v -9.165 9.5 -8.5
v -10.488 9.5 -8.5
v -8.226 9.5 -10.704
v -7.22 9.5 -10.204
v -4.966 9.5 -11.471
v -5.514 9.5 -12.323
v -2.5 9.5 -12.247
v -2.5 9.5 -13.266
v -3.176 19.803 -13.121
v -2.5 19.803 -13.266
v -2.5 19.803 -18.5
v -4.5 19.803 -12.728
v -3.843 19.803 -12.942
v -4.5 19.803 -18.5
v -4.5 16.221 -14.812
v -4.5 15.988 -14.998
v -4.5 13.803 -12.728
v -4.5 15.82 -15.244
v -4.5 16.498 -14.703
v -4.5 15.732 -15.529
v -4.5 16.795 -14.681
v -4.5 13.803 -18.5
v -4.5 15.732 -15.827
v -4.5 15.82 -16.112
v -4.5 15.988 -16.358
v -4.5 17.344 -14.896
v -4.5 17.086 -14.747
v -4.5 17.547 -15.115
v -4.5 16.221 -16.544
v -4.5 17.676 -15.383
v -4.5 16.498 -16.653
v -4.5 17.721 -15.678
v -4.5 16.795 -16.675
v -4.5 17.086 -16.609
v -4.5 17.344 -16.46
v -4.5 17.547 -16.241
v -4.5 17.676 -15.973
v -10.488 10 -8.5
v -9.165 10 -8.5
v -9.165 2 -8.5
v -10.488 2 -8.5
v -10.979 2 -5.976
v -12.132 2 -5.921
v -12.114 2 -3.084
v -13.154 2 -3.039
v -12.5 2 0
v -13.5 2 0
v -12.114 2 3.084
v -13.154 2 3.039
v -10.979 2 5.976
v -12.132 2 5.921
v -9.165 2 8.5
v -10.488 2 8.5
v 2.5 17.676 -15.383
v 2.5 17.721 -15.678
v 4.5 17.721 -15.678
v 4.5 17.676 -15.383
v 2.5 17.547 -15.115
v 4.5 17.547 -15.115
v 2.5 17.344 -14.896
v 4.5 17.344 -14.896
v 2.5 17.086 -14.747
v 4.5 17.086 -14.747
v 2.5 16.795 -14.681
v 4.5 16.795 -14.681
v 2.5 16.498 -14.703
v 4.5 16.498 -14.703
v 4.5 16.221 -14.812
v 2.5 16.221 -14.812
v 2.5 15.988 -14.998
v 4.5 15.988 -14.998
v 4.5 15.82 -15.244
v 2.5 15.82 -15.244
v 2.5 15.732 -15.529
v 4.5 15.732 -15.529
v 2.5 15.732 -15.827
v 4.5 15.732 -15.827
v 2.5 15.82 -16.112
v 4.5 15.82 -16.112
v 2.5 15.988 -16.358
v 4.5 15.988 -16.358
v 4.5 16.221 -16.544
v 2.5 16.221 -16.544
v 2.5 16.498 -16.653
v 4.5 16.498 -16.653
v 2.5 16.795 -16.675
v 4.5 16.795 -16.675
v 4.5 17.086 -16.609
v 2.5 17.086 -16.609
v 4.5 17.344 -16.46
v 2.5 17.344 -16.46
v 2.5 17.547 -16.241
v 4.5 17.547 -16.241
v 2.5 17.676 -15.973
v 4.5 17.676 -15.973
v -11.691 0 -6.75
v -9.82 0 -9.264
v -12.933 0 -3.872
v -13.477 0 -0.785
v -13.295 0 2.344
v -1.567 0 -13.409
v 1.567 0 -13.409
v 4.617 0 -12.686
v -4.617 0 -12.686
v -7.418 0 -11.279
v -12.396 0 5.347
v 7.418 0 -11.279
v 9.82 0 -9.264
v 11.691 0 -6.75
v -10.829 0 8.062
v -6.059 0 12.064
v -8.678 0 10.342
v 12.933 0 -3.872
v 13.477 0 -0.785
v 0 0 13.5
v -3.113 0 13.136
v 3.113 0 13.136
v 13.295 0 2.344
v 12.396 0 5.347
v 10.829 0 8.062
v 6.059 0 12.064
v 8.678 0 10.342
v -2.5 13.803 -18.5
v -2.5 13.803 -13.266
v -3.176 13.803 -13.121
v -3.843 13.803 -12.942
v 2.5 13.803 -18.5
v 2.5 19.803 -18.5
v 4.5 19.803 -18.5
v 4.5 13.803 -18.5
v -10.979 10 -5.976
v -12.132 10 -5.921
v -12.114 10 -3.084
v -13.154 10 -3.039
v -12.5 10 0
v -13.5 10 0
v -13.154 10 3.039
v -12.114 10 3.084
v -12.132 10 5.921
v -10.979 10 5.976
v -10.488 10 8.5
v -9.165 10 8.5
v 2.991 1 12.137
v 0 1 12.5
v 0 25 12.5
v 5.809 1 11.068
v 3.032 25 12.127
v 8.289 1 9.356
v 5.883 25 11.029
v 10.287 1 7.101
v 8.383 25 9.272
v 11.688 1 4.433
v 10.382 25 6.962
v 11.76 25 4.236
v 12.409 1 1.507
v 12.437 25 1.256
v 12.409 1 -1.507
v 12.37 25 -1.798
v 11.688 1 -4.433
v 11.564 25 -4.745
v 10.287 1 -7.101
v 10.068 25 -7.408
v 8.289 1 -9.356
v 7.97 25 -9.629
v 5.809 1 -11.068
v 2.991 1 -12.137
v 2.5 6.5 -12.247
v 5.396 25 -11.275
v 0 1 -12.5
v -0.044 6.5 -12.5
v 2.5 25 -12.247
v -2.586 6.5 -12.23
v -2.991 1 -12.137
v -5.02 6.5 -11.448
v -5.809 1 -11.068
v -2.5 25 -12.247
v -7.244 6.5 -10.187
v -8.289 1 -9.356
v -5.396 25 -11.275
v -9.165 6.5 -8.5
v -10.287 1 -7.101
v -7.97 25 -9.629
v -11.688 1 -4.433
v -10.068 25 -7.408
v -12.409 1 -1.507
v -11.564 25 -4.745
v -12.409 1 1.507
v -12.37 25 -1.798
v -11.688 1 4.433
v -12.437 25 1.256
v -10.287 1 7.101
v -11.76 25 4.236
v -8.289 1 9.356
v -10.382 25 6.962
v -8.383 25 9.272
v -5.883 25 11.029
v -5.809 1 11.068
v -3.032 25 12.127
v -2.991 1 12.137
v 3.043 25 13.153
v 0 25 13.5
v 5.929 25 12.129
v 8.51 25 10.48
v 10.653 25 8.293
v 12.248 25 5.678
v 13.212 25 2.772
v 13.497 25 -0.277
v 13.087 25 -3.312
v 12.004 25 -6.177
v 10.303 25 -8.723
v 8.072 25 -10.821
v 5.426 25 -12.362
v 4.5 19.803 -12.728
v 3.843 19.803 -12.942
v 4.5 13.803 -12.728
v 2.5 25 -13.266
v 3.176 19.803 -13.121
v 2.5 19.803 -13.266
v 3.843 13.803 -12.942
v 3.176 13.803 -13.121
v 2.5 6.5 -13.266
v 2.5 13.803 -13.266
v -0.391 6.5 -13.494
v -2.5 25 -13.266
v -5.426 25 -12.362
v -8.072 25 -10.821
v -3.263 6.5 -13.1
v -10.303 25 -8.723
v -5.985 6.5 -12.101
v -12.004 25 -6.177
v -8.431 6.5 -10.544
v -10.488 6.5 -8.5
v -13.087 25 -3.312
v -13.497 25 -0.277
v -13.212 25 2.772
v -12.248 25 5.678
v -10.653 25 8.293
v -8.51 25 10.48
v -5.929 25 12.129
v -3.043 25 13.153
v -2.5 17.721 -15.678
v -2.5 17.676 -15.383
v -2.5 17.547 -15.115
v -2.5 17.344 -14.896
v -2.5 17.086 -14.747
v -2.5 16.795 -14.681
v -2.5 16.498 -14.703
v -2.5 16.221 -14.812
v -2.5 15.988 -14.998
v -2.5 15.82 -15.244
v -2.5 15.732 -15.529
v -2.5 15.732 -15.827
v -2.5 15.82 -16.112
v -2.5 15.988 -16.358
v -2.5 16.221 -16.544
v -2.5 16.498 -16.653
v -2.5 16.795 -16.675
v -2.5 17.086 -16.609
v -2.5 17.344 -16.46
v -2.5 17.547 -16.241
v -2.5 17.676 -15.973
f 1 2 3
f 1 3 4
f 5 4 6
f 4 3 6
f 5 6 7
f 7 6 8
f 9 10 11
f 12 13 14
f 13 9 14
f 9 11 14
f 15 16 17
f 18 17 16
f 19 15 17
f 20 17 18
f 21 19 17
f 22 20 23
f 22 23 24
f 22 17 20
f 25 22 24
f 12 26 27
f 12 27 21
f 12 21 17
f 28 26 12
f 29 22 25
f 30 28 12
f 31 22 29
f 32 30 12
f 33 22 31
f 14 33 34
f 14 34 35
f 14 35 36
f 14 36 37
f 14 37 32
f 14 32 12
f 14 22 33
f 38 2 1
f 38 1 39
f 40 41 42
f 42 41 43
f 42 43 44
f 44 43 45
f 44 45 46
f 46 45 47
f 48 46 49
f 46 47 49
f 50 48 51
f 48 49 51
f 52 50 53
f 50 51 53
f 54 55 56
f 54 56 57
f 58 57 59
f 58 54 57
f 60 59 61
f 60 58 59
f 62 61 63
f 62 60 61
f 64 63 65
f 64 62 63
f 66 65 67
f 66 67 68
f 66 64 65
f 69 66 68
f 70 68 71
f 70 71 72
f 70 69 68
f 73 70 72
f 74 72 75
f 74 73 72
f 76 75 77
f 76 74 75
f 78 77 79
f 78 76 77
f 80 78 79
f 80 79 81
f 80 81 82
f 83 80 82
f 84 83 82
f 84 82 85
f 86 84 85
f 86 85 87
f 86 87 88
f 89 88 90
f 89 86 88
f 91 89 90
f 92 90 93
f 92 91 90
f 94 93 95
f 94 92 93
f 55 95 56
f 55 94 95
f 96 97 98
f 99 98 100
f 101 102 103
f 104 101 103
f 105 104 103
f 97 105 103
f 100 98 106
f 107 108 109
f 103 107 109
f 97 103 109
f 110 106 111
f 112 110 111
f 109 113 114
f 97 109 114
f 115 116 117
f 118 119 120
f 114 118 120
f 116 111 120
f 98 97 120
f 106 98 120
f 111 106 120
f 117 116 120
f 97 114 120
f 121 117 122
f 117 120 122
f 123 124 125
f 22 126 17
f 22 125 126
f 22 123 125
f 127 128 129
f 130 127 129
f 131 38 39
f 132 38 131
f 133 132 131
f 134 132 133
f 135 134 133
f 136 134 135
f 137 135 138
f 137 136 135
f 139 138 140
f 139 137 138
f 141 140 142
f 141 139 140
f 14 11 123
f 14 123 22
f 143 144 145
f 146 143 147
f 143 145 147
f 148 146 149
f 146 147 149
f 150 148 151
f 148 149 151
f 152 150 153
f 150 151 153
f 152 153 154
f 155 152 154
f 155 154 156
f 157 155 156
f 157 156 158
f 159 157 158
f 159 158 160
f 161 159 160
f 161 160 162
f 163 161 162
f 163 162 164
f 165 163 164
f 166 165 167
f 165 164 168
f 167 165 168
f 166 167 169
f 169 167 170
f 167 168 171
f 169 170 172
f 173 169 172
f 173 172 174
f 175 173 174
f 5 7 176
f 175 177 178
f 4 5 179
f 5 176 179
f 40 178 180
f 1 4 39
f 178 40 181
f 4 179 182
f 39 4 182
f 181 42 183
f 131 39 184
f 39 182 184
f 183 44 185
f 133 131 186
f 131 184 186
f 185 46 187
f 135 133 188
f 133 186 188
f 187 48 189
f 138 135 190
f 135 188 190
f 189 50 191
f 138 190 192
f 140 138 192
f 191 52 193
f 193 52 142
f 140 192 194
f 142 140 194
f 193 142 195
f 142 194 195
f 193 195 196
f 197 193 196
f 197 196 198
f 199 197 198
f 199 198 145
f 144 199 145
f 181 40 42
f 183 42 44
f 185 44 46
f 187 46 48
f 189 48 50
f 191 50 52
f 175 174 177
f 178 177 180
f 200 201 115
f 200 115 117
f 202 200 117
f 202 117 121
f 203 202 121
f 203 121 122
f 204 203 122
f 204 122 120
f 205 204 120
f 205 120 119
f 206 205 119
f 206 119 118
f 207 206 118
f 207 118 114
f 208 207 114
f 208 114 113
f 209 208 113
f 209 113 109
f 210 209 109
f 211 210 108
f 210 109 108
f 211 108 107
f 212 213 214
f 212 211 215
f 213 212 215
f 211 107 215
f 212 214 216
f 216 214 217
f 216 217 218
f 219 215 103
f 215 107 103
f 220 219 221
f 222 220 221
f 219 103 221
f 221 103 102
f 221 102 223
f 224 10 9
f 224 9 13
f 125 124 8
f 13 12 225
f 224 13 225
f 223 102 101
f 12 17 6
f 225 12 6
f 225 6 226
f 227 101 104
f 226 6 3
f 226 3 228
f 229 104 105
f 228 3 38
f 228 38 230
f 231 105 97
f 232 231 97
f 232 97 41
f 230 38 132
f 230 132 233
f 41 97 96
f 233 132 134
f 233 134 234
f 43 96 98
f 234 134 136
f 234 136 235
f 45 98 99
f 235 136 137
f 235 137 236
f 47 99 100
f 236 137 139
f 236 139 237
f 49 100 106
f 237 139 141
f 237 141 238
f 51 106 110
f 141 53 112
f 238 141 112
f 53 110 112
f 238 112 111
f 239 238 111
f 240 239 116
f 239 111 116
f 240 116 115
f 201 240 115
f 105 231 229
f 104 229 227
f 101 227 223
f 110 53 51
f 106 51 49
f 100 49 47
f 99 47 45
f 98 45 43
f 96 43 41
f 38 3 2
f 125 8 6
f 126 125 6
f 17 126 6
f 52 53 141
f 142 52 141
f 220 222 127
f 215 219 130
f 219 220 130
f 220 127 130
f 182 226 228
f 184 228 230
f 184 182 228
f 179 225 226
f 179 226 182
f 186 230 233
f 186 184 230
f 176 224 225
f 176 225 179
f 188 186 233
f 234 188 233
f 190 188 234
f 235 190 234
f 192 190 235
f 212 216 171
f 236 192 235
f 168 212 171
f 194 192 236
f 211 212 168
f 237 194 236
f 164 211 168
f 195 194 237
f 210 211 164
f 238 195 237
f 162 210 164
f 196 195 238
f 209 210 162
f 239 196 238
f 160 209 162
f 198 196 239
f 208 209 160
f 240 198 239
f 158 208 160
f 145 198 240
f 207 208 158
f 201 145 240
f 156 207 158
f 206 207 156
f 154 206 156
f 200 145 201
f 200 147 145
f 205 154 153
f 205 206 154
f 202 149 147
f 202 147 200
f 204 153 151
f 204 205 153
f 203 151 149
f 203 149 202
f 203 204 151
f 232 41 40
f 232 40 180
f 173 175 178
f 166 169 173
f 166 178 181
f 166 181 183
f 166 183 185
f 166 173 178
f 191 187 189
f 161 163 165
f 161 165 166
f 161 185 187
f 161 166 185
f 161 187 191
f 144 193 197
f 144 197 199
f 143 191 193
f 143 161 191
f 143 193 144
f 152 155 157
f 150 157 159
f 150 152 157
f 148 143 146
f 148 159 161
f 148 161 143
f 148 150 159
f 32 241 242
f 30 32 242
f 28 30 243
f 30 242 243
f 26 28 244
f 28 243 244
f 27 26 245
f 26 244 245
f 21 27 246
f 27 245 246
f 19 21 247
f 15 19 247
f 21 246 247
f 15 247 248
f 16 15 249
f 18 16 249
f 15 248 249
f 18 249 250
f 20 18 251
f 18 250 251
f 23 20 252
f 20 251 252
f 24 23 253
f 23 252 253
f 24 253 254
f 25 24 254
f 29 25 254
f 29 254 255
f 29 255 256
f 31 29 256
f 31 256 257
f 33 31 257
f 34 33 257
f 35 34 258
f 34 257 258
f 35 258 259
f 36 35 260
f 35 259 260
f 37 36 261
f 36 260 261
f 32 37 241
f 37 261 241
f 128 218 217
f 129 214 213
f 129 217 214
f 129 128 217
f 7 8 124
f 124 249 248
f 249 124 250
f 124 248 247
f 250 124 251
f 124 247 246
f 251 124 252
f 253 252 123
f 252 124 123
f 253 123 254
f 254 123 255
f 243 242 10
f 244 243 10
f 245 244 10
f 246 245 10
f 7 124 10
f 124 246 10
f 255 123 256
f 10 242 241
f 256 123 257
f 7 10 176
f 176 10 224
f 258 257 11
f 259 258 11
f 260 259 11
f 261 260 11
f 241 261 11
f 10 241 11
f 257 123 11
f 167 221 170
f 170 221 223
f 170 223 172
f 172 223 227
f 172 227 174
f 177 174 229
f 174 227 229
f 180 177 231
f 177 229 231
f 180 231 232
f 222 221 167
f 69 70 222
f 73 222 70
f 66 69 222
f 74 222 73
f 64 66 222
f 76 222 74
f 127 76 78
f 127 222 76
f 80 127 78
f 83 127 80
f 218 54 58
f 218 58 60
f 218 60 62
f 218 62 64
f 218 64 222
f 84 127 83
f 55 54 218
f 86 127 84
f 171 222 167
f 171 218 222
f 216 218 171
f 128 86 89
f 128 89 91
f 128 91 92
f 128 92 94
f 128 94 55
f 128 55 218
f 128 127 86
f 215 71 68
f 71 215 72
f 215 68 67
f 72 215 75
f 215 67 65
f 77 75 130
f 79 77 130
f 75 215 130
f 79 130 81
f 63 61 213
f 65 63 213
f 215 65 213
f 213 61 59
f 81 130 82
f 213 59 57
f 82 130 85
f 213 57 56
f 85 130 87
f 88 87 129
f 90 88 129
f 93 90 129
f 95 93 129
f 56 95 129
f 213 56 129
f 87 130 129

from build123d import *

# Parameters (mm, degrees)
SKETCH1_R                       = 13.5
BOSS_EXTRUDE1_DEPTH             = 25
SKETCH2_R                       = 12.5
CUT_EXTRUDE1_DEPTH              = 24
SKETCH3_W                       = 17
SKETCH3_H                       = 8
CUT_EXTRUDE2_DEPTH              = 9
CUT_EXTRUDE3_DEPTH              = 9
SKETCH5_W                       = 2
SKETCH5_H                       = 6
BOSS_EXTRUDE2_DEPTH             = 5
BOSS_EXTRUDE2_DIRECTION_2_REACH = 41.195
SKETCH6_R                       = 1
CUT_EXTRUDE4_DEPTH              = 2


with BuildPart() as part:
    # Sketch1 → Boss-Extrude1 (new body)
    with BuildSketch(Plane(origin=(0, 0, 0), x_dir=(1, 0, 0), z_dir=(0, 1, 0))):
        with Locations(Location((0, 0, 0), (0, 0, 270))):
            Circle(SKETCH1_R)
    extrude(amount=BOSS_EXTRUDE1_DEPTH)

    # Sketch2 → Cut-Extrude1 (cut)
    with BuildSketch(Plane(origin=(0, 25, 0), x_dir=(1, 0, 0), z_dir=(0, 1, 0))):
        with Locations(Location((0, 0, 0), (0, 0, 270))):
            Circle(SKETCH2_R)
    extrude(amount=-CUT_EXTRUDE1_DEPTH, mode=Mode.SUBTRACT)

    # Sketch3 → Cut-Extrude2 (cut)
    with BuildSketch(Plane.ZY.offset(13.5)):
        with Locations((0, 6)):
            Rectangle(SKETCH3_W, SKETCH3_H)
    extrude(amount=-CUT_EXTRUDE2_DEPTH, mode=Mode.SUBTRACT)

    # Sketch4 → Cut-Extrude3 (cut)
    with BuildSketch(Plane(origin=(0, 0, -13.5), x_dir=(-1, 0, 0), z_dir=(0, 0, -1))):
        Polygon((2.5, 25), (-2.5, 25), (-2.5, 9.5), (-2.5, 6.5), (10.5, 6.5), (10.5, 9.5), (2.5, 9.5), align=None)
    extrude(amount=-CUT_EXTRUDE3_DEPTH, mode=Mode.SUBTRACT)

    # Sketch5 → Boss-Extrude2 (add)
    with BuildSketch(Plane(origin=(0, 0, -13.5), x_dir=(-1, 0, 0), z_dir=(0, 0, -1))):
        with Locations((3.5, 16.80292759)):
            Rectangle(SKETCH5_W, SKETCH5_H)
    boss_extrude2 = extrude(amount=BOSS_EXTRUDE2_DEPTH)

    # Sketch5 → Boss-Extrude2 direction 2 (add, up to next)
    with BuildSketch(Plane(origin=(0, 0, -13.5), x_dir=(-1, 0, 0), z_dir=(0, 0, -1)), mode=Mode.PRIVATE) as boss_extrude2_direction_2_sk1:
        with Locations((3.5, 16.80292759)):
            Rectangle(SKETCH5_W, SKETCH5_H)
    boss_extrude2_direction_2_tool1 = extrude(boss_extrude2_direction_2_sk1.sketch, amount=-BOSS_EXTRUDE2_DIRECTION_2_REACH, mode=Mode.PRIVATE) - part.part
    boss_extrude2_direction_2 = boss_extrude2_direction_2_tool1.solids().sort_by_distance((-3.5, 16.802928, -13.5))[0]
    add(boss_extrude2_direction_2)

    # Sketch6 → Cut-Extrude4 (cut)
    with BuildSketch(Plane(origin=(-2.5, 0, 0), x_dir=(0, 0, -1), z_dir=(1, 0, 0))):
        with Locations(Location((15.677904261, 16.72055598, 0), (0, 0, 90))):
            Circle(SKETCH6_R)
    cut_extrude4 = extrude(amount=-CUT_EXTRUDE4_DEPTH, mode=Mode.SUBTRACT)

    # Mirror1: Boss-Extrude2, Boss-Extrude2 direction 2, Cut-Extrude4 across plane
    add(boss_extrude2.mirror(Plane(origin=(0, 0, 0), x_dir=(0, 0, 1), z_dir=(1, 0, 0))))
    add(boss_extrude2_direction_2.mirror(Plane(origin=(0, 0, 0), x_dir=(0, 0, 1), z_dir=(1, 0, 0))))
    add(cut_extrude4.mirror(Plane(origin=(0, 0, 0), x_dir=(0, 0, 1), z_dir=(1, 0, 0))), mode=Mode.SUBTRACT)


solid = part.part
